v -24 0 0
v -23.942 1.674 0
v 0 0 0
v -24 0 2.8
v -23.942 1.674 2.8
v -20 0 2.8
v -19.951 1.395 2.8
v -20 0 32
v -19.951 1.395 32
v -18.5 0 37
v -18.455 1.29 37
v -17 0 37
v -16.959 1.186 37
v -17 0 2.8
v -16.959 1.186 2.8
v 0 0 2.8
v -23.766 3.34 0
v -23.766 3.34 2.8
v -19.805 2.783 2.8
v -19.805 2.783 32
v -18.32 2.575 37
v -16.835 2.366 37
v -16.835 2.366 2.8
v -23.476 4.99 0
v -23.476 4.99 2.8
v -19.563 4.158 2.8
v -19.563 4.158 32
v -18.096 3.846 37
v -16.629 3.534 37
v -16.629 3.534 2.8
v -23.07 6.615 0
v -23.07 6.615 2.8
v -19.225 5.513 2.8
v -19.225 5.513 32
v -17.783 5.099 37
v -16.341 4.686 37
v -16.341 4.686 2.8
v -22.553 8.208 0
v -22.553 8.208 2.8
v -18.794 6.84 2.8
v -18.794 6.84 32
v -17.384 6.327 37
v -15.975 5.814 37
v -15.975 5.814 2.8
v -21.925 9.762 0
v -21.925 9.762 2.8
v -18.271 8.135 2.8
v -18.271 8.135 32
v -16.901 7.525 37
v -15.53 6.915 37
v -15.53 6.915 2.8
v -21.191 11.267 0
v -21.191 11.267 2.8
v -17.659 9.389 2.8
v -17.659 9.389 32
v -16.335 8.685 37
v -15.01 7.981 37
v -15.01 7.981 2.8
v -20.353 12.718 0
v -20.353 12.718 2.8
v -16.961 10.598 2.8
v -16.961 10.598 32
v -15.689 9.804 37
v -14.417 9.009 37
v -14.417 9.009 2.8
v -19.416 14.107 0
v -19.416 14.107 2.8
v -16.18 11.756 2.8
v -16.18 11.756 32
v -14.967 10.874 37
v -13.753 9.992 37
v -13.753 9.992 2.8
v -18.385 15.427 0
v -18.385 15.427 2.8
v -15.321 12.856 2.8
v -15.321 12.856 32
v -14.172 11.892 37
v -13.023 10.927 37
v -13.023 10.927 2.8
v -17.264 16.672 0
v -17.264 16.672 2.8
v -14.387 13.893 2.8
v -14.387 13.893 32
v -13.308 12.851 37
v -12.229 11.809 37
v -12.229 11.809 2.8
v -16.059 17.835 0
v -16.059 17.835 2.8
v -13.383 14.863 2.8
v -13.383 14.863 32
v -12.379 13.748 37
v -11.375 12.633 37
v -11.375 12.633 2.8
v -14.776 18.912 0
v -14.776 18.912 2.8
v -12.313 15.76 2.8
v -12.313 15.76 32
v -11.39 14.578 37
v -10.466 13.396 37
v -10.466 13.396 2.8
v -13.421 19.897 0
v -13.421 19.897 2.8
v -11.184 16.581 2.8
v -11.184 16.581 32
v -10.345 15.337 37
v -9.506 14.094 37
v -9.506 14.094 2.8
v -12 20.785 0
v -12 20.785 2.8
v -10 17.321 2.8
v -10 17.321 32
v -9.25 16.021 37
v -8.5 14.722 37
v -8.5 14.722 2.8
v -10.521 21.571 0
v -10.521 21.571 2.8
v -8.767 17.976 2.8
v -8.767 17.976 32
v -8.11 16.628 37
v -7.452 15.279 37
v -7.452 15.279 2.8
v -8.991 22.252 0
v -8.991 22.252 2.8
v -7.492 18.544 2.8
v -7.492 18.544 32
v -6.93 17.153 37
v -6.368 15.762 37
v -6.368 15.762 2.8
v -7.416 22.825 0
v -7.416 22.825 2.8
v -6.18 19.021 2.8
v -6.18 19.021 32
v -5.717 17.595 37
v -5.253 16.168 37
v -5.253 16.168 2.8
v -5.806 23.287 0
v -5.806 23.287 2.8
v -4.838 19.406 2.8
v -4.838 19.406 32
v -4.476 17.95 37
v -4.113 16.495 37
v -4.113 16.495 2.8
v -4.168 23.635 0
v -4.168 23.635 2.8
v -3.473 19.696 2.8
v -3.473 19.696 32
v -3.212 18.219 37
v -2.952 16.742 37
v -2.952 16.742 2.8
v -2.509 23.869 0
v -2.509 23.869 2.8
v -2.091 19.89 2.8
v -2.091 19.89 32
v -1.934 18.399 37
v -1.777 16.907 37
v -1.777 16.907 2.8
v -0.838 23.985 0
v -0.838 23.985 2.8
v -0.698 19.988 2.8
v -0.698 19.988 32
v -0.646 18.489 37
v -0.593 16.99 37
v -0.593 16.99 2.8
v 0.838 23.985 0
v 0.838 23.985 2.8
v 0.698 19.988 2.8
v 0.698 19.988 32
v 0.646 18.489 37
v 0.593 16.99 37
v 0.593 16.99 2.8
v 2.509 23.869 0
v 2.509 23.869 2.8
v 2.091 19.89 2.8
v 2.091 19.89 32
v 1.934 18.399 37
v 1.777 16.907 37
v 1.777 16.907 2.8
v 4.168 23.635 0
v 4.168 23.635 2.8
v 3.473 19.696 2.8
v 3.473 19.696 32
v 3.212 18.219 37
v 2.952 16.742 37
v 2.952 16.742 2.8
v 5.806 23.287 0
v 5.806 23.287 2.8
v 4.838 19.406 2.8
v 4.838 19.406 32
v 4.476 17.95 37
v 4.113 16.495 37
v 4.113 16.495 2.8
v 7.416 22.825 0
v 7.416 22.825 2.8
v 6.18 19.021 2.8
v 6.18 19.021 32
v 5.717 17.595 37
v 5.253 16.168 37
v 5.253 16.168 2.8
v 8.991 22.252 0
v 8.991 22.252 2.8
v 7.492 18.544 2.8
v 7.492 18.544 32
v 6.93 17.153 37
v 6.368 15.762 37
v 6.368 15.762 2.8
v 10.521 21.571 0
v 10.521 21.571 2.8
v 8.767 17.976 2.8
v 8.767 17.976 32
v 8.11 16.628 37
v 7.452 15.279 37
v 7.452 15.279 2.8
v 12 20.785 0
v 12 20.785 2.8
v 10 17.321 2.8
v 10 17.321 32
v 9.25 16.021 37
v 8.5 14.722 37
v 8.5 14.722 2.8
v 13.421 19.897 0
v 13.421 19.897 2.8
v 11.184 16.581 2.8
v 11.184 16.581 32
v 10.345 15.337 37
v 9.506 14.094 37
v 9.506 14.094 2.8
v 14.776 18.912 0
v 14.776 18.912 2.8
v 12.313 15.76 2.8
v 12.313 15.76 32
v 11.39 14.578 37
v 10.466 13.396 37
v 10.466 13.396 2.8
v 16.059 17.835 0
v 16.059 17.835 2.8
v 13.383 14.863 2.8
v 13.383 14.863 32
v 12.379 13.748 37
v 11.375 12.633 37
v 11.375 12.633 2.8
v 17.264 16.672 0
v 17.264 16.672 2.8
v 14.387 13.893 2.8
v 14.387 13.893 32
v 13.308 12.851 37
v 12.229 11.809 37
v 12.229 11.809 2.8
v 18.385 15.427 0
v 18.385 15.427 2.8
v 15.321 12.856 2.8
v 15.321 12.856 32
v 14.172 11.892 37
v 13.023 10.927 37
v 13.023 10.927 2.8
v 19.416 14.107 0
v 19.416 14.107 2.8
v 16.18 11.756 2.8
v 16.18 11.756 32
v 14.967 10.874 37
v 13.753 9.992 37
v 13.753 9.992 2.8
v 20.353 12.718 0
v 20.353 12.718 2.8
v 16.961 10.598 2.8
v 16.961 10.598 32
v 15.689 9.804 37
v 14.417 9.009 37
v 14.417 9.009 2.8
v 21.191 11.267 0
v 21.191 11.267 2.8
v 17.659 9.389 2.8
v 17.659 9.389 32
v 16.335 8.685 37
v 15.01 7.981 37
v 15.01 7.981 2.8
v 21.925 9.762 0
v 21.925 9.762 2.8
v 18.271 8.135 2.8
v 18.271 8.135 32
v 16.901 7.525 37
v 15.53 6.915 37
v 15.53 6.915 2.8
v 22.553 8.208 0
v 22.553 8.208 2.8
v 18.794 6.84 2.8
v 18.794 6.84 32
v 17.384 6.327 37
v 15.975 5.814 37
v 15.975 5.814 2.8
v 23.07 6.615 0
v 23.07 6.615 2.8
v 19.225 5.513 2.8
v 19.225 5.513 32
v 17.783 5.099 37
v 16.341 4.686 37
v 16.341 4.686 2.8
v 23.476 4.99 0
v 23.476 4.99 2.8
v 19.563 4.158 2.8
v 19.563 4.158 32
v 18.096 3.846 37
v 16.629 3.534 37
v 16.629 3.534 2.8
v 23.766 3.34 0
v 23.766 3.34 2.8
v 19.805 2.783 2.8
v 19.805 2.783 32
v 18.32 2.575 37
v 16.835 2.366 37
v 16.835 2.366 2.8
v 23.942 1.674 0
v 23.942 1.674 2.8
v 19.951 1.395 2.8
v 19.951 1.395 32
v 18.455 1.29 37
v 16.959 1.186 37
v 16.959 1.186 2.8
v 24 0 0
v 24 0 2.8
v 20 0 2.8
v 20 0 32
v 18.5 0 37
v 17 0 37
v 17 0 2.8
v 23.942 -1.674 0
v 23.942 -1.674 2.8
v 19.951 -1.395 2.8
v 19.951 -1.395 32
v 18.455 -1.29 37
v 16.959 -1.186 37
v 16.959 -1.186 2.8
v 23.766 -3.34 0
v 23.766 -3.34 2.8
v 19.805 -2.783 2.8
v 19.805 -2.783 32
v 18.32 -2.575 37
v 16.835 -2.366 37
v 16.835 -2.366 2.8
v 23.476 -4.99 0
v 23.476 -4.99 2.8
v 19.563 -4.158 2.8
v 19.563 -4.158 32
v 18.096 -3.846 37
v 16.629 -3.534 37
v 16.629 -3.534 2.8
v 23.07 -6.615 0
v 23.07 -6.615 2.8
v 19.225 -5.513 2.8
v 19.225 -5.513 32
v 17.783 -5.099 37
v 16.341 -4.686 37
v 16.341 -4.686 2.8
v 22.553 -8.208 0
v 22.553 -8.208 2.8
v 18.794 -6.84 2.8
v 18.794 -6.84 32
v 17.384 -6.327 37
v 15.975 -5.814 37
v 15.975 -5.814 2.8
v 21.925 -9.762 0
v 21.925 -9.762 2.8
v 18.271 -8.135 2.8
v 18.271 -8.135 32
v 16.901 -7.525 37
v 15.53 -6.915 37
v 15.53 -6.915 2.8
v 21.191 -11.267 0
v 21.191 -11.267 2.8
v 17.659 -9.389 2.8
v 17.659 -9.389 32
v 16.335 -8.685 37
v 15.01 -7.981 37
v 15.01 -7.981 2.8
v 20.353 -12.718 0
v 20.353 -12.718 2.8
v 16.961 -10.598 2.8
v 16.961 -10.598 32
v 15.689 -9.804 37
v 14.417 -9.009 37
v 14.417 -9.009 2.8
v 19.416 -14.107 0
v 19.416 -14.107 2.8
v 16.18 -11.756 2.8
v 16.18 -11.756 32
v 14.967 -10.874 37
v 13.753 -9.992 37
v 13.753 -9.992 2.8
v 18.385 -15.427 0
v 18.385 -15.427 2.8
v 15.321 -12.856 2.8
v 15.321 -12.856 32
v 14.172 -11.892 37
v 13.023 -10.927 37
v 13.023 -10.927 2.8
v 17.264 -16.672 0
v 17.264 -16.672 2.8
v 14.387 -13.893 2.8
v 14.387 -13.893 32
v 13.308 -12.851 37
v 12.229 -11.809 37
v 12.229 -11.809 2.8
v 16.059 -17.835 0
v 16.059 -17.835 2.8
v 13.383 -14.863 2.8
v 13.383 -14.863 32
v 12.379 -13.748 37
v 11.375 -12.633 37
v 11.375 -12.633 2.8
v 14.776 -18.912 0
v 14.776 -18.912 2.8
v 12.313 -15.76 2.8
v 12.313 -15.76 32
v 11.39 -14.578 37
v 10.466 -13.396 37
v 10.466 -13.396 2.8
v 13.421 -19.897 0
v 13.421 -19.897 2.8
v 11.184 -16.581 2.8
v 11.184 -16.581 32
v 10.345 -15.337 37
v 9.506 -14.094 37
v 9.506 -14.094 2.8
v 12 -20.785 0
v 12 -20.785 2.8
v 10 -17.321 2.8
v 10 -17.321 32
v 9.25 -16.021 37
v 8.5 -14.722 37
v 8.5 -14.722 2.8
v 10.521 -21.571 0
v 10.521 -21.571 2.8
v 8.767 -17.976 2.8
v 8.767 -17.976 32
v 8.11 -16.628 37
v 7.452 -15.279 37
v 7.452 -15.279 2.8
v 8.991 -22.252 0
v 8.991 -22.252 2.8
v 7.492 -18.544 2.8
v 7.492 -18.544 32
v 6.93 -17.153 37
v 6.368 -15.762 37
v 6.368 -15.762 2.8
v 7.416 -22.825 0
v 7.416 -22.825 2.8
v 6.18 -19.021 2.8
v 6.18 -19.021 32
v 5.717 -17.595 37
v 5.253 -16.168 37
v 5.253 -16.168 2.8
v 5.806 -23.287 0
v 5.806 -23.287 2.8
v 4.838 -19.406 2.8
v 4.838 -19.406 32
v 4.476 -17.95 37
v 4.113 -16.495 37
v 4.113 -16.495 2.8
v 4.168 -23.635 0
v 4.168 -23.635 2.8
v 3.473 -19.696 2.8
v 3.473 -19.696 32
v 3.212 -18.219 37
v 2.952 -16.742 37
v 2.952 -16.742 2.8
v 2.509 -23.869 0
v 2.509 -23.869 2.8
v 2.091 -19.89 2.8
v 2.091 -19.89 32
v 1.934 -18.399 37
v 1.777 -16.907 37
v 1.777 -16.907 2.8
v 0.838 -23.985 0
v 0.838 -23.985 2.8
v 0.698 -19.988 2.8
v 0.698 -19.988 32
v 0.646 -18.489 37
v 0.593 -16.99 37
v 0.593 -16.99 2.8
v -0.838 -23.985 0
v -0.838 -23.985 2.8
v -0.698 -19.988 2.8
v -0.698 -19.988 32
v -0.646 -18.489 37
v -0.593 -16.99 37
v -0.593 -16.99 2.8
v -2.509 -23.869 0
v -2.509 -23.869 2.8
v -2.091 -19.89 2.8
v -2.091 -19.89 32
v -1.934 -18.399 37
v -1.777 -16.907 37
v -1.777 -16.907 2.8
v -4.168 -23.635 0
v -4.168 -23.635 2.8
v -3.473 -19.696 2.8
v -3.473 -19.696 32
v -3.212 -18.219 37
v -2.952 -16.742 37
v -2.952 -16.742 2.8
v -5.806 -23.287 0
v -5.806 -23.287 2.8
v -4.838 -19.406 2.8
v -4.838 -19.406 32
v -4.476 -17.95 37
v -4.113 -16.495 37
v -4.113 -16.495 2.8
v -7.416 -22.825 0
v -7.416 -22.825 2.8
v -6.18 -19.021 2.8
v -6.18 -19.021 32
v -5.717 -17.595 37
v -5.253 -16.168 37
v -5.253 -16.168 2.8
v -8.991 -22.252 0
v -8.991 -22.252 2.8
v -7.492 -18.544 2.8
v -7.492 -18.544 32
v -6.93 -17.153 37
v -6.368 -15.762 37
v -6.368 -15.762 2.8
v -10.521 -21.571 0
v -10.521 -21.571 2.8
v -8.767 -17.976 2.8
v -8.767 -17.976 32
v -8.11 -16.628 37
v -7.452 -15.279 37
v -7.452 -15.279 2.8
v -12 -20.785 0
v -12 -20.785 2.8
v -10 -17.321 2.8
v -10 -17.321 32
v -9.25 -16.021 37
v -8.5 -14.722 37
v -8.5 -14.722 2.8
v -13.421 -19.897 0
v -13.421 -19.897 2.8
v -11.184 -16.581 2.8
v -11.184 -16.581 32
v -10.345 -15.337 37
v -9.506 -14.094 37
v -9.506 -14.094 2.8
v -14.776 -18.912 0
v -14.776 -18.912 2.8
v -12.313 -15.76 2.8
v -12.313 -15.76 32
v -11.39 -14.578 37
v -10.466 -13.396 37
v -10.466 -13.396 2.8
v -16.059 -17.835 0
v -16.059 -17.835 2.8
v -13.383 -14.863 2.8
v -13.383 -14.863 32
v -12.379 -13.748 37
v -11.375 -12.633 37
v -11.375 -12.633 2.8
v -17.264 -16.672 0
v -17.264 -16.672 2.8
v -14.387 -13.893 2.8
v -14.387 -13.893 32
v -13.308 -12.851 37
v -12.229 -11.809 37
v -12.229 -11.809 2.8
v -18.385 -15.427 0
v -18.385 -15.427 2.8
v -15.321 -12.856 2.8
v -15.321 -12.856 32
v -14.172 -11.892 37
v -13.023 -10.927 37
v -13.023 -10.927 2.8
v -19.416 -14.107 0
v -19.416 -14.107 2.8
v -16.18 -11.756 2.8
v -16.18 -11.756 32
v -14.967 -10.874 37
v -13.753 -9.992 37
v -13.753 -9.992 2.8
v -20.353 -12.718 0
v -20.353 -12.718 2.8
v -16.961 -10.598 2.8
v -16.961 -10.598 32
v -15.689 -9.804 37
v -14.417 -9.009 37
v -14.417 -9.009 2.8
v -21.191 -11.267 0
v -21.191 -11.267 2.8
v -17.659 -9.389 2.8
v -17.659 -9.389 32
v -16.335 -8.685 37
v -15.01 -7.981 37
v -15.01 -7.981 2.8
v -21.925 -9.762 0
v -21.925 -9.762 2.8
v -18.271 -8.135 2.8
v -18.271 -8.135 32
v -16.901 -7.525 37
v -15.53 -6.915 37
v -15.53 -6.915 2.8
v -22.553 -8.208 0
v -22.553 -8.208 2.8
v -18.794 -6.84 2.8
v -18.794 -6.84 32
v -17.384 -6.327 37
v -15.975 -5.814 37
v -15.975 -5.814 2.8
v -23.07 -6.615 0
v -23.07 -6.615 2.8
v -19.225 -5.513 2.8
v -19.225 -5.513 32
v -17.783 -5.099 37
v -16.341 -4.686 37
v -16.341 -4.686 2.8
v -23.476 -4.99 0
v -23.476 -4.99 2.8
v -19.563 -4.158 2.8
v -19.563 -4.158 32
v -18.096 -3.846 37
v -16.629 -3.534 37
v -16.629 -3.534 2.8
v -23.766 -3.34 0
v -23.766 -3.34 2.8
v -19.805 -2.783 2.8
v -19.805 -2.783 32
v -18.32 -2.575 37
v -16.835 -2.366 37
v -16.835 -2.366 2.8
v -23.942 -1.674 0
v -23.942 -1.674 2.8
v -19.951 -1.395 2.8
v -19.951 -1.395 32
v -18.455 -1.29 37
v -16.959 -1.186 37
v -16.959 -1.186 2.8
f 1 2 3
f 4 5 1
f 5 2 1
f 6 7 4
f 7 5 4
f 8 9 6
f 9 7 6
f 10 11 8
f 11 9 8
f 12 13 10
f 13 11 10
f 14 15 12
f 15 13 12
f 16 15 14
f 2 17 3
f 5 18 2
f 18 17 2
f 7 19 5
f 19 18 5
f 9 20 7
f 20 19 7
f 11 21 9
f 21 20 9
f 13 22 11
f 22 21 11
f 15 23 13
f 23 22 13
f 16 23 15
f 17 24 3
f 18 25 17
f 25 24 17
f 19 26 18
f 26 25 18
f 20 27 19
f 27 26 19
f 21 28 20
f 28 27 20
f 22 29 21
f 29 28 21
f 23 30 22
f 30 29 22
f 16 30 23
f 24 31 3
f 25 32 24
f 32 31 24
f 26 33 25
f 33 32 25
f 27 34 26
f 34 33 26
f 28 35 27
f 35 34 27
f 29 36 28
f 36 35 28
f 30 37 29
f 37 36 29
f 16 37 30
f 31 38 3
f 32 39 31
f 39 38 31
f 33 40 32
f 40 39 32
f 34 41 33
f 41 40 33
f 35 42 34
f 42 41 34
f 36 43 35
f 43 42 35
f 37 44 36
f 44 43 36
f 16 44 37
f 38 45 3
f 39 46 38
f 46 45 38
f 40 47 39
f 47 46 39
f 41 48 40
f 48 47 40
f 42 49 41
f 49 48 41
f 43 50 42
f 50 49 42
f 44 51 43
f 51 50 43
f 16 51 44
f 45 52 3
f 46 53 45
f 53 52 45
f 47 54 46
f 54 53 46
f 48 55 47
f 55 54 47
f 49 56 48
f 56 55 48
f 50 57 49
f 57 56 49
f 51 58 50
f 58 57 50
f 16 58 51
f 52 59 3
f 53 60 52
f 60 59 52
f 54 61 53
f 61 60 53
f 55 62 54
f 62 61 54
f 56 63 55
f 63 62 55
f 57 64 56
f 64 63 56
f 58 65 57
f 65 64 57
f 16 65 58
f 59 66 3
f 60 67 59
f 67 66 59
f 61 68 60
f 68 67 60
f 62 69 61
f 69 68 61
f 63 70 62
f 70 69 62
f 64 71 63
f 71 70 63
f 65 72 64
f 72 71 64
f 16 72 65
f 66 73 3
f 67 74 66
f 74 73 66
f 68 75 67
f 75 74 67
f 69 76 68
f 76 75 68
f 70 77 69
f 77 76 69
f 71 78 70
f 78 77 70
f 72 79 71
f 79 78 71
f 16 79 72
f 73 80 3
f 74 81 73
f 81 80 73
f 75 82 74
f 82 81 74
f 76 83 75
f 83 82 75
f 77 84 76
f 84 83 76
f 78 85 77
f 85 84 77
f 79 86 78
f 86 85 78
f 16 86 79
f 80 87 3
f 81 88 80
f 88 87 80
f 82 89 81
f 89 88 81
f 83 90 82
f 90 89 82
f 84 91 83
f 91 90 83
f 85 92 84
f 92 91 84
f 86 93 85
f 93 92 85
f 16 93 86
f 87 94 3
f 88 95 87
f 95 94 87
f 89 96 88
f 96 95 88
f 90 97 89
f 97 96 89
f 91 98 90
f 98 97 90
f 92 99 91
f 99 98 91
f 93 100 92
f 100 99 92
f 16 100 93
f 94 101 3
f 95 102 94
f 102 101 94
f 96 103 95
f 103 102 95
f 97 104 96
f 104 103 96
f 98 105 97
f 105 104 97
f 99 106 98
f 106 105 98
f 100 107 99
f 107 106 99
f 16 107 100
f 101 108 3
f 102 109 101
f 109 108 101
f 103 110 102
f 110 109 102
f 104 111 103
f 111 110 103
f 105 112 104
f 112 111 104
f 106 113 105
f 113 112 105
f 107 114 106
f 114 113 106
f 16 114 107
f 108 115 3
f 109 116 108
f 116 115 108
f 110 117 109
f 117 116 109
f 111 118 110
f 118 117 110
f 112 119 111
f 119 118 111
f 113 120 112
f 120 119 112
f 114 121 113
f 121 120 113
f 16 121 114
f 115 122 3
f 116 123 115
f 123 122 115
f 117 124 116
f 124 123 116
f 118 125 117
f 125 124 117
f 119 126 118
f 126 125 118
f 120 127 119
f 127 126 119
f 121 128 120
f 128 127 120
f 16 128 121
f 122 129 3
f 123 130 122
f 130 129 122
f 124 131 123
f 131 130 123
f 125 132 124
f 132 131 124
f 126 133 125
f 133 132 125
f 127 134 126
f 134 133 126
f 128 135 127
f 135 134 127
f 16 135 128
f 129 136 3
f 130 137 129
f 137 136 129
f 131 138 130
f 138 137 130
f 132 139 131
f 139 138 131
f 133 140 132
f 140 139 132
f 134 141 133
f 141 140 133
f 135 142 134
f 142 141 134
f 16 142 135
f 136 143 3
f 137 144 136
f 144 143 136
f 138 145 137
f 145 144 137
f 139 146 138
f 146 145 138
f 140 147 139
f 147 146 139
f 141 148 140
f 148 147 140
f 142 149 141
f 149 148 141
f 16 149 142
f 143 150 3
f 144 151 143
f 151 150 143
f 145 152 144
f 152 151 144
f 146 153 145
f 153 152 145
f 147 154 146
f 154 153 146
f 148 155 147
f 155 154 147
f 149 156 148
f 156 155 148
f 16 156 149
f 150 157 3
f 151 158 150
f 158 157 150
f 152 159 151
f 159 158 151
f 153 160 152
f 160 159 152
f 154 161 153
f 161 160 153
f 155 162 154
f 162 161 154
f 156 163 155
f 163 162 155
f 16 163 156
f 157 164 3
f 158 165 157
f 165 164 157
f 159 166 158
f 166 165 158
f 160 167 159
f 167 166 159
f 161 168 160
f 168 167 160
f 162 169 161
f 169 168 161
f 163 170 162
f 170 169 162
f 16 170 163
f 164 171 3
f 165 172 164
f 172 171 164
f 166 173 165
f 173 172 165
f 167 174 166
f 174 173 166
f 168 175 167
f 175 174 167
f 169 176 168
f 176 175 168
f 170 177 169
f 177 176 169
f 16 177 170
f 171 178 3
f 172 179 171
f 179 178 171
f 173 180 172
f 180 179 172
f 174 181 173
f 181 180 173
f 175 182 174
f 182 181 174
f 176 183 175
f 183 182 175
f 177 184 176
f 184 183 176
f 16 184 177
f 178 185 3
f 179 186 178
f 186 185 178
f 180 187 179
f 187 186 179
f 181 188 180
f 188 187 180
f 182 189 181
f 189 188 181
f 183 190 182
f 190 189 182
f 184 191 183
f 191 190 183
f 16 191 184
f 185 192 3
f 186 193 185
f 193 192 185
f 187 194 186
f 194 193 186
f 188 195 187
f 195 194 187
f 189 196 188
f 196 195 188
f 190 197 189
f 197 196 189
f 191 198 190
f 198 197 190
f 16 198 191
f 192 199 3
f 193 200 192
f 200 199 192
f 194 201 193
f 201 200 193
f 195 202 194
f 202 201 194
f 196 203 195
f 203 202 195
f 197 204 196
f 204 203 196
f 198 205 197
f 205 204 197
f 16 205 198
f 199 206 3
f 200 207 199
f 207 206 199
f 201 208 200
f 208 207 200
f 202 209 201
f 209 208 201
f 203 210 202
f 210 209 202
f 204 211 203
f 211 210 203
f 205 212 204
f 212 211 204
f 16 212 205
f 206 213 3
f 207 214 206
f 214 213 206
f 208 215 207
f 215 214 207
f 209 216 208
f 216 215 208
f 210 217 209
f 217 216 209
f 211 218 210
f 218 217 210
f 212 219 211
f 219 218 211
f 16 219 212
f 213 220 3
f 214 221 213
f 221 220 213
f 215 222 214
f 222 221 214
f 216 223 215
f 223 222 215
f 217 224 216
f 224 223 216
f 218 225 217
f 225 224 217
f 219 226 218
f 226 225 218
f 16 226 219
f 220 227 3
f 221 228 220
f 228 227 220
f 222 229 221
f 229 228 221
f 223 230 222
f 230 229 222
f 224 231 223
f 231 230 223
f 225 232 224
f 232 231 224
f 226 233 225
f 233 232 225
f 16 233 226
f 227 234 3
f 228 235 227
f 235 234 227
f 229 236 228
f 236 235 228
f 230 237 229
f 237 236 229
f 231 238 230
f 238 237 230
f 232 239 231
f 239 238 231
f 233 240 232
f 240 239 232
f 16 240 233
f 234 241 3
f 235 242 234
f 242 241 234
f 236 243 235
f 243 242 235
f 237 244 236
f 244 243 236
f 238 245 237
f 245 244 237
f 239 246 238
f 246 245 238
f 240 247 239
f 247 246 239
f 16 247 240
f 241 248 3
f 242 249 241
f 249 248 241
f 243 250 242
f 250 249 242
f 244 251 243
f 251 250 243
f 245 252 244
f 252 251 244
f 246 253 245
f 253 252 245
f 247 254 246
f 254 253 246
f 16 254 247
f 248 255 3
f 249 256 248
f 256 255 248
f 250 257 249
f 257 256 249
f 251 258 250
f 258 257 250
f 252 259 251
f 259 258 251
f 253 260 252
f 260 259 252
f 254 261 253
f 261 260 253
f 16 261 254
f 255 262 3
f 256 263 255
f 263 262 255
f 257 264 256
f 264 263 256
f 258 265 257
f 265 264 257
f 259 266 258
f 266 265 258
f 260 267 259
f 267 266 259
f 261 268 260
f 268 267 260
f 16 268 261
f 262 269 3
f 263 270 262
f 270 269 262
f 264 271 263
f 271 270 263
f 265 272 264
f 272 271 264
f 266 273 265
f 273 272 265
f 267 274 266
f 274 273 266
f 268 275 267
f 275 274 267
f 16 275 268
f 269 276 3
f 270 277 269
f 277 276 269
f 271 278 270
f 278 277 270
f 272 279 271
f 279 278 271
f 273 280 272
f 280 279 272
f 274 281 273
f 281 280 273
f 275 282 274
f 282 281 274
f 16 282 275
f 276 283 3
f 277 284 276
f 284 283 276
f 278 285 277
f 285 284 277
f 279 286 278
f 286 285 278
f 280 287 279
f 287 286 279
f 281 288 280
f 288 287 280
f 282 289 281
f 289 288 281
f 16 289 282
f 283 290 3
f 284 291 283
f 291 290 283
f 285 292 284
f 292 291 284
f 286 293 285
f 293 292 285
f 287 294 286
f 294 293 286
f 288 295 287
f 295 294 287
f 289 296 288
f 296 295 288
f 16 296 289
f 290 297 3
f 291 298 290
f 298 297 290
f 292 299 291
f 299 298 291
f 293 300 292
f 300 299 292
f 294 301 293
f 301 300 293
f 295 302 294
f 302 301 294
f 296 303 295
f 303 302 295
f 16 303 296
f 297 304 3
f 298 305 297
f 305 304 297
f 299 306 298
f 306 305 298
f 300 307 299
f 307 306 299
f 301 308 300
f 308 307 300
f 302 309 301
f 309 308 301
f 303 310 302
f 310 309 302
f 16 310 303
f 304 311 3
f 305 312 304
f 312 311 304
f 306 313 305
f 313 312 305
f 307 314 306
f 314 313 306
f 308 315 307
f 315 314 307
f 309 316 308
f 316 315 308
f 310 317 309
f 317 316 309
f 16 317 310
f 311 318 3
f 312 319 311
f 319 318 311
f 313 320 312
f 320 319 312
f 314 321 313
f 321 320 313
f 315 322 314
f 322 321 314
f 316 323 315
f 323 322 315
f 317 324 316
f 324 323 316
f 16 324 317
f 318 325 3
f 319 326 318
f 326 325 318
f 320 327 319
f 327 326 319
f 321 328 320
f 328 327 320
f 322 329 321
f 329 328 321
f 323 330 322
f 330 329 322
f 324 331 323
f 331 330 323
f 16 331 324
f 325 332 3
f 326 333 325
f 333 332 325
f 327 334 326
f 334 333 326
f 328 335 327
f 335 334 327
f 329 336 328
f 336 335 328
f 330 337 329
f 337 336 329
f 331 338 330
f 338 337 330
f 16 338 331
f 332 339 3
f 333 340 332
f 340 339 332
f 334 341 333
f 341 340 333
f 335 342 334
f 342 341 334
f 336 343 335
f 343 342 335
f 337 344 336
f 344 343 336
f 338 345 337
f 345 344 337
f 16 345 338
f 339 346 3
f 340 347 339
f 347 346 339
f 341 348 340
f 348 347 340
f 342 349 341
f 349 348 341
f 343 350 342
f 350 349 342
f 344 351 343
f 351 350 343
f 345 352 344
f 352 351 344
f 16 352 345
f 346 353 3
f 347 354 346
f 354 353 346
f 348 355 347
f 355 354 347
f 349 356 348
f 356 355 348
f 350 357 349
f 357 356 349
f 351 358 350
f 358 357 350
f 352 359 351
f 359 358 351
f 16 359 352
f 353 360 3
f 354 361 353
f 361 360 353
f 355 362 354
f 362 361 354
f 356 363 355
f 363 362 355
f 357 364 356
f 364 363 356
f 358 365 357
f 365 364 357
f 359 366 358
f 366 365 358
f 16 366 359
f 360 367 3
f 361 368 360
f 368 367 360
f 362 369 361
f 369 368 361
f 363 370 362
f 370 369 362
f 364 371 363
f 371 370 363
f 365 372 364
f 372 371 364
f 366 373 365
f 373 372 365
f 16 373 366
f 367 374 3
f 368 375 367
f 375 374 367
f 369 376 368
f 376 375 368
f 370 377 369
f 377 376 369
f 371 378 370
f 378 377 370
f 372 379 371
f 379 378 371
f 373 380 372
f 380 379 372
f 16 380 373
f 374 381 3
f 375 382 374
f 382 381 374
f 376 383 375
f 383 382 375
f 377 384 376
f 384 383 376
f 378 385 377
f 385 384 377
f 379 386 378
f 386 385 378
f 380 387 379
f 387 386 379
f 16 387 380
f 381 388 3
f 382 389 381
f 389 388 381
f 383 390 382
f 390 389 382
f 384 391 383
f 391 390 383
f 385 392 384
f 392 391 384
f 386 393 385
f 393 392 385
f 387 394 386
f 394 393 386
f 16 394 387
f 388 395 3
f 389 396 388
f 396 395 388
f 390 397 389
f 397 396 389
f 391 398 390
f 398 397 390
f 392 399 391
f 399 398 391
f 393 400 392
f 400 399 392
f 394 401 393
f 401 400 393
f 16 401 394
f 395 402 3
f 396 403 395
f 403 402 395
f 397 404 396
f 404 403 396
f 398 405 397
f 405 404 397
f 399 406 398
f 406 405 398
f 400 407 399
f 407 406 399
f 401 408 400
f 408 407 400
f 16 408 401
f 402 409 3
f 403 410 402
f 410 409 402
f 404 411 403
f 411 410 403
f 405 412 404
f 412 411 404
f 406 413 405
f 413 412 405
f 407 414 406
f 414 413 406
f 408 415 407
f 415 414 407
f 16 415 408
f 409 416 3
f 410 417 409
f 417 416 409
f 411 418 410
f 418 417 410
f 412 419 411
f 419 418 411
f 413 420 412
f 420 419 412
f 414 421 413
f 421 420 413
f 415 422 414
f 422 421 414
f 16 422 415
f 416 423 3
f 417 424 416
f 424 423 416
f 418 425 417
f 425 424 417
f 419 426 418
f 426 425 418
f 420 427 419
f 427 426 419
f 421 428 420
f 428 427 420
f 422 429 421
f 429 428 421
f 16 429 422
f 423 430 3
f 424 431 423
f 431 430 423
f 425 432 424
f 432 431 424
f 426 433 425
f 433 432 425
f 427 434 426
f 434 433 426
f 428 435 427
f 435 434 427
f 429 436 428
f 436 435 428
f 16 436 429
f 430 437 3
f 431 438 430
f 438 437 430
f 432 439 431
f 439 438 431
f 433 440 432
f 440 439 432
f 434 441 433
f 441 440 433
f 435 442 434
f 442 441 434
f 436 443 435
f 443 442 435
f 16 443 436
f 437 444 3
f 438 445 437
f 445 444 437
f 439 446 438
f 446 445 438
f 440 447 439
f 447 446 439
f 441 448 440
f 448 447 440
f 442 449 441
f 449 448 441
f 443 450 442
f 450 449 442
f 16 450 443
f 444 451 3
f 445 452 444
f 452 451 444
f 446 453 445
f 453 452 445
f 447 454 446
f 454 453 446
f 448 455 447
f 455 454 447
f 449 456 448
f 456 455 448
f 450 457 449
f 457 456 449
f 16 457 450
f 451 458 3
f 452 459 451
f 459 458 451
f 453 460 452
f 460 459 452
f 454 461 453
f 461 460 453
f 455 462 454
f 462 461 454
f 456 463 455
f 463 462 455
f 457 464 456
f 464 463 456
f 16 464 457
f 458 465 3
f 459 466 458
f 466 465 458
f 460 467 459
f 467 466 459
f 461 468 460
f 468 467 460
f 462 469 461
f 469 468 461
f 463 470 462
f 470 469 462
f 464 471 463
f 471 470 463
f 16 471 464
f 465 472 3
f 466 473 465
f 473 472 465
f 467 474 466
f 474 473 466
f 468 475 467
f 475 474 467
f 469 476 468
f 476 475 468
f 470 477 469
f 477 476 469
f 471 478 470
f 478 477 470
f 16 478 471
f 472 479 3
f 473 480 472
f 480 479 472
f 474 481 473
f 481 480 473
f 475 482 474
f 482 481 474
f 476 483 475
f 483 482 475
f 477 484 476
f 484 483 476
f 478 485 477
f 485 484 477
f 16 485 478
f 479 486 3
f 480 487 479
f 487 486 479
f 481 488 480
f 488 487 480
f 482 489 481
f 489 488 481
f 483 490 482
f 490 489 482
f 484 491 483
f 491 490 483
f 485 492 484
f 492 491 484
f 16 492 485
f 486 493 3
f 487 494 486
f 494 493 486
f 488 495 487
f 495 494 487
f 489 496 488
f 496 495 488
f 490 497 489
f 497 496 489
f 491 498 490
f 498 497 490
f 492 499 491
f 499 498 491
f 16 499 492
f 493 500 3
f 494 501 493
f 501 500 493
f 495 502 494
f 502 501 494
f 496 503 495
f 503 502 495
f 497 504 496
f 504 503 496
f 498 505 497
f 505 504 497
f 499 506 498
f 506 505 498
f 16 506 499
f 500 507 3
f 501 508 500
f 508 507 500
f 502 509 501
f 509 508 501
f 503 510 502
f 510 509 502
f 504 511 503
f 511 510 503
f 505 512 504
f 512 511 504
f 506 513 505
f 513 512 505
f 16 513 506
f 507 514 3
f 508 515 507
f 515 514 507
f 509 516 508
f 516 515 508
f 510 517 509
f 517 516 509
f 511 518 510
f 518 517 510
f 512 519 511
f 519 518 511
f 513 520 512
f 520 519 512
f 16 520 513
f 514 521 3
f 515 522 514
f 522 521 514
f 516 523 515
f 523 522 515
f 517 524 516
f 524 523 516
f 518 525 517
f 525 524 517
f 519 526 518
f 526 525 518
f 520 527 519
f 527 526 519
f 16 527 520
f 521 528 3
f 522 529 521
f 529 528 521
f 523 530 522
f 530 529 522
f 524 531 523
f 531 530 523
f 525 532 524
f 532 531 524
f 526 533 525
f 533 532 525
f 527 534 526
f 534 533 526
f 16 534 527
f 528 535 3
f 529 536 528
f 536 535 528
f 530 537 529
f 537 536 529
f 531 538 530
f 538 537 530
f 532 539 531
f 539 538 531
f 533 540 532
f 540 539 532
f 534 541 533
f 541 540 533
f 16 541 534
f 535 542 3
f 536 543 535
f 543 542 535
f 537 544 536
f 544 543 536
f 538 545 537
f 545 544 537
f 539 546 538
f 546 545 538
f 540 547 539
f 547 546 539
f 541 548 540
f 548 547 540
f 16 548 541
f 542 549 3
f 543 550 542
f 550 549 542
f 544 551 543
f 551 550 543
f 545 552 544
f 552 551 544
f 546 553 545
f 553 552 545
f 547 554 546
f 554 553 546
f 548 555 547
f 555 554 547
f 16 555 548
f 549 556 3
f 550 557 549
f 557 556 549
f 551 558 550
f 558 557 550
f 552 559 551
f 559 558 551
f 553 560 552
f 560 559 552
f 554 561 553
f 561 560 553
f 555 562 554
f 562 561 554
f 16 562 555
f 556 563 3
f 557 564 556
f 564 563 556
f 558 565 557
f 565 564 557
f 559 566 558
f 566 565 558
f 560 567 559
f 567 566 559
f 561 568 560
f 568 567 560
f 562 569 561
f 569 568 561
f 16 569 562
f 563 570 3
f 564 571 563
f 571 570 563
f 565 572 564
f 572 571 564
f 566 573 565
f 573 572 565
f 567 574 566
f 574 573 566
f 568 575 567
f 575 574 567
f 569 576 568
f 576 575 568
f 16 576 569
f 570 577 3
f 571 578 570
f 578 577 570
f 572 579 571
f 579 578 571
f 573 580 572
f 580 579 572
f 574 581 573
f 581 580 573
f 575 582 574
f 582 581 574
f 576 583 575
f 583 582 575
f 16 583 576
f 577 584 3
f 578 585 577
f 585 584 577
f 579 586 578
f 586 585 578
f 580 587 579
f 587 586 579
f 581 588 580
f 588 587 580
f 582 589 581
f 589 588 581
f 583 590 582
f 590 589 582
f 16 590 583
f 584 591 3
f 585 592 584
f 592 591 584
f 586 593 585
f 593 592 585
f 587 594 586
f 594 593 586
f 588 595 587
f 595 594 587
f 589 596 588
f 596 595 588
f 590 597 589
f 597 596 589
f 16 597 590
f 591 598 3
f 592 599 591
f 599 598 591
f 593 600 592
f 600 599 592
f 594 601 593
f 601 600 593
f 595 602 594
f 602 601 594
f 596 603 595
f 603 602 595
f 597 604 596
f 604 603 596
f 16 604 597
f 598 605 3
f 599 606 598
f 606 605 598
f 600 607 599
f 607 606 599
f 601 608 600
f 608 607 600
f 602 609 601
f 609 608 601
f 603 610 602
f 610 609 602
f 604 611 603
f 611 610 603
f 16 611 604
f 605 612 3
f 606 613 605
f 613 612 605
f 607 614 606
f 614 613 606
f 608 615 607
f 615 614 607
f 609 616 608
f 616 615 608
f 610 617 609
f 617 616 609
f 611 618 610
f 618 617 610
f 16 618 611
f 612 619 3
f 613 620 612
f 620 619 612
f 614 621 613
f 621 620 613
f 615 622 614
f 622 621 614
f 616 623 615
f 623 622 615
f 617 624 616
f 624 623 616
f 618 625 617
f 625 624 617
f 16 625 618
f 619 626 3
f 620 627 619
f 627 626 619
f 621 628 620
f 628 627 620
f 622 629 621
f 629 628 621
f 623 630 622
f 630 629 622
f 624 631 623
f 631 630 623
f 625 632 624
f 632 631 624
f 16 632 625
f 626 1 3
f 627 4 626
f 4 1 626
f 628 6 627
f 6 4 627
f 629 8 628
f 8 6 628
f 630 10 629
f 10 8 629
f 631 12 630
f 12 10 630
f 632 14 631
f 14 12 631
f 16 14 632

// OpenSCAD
/*
 * Pipe Cap
 *
 * Author: Pavel Rampas
 * Version: 1.0.0 (Changelog is at the bottom)
 * License: CC BY-SA 4.0 [https://creativecommons.org/licenses/by-sa/4.0/]
 * Link: https://github.com/pavelrampas/openscad-models
 *
 * OpenSCAD version: 2021.01
 *
 * Instructions:
 * Set up parameters, render and print.
 *
 * Height is layer.
 * Thickness is perimeter.
 */

// Parameters
//------------------------------------------------------------------------------

$fn = $preview ? 15 : 90;

outerPipeDiameter = 40;

// Parameters that don't need to be changed
//------------------------------------------------------------------------------

thickness = 3;
height = 37; // min 5
capHeight = 2.8;
capDiameter = outerPipeDiameter + 8;

// Code
//------------------------------------------------------------------------------

rotate_extrude() {
    // cap
    square([capDiameter / 2, capHeight]);

    // pipe
    translate([(outerPipeDiameter / 2) - thickness, 0, 0]) {
        square([thickness, height - 5]);
    }

    // pipe end
    translate([(outerPipeDiameter / 2) - thickness, 0, 0]) {
        polygon([
            [0, height - 5],
            [0, height],
            [thickness / 2, height] ,
            [thickness, height - 5]
        ]);
    }
}

// Functions
//------------------------------------------------------------------------------

// Modules
//------------------------------------------------------------------------------

// Changelog
//------------------------------------------------------------------------------

// [1.0.0]:
// Initial release.
